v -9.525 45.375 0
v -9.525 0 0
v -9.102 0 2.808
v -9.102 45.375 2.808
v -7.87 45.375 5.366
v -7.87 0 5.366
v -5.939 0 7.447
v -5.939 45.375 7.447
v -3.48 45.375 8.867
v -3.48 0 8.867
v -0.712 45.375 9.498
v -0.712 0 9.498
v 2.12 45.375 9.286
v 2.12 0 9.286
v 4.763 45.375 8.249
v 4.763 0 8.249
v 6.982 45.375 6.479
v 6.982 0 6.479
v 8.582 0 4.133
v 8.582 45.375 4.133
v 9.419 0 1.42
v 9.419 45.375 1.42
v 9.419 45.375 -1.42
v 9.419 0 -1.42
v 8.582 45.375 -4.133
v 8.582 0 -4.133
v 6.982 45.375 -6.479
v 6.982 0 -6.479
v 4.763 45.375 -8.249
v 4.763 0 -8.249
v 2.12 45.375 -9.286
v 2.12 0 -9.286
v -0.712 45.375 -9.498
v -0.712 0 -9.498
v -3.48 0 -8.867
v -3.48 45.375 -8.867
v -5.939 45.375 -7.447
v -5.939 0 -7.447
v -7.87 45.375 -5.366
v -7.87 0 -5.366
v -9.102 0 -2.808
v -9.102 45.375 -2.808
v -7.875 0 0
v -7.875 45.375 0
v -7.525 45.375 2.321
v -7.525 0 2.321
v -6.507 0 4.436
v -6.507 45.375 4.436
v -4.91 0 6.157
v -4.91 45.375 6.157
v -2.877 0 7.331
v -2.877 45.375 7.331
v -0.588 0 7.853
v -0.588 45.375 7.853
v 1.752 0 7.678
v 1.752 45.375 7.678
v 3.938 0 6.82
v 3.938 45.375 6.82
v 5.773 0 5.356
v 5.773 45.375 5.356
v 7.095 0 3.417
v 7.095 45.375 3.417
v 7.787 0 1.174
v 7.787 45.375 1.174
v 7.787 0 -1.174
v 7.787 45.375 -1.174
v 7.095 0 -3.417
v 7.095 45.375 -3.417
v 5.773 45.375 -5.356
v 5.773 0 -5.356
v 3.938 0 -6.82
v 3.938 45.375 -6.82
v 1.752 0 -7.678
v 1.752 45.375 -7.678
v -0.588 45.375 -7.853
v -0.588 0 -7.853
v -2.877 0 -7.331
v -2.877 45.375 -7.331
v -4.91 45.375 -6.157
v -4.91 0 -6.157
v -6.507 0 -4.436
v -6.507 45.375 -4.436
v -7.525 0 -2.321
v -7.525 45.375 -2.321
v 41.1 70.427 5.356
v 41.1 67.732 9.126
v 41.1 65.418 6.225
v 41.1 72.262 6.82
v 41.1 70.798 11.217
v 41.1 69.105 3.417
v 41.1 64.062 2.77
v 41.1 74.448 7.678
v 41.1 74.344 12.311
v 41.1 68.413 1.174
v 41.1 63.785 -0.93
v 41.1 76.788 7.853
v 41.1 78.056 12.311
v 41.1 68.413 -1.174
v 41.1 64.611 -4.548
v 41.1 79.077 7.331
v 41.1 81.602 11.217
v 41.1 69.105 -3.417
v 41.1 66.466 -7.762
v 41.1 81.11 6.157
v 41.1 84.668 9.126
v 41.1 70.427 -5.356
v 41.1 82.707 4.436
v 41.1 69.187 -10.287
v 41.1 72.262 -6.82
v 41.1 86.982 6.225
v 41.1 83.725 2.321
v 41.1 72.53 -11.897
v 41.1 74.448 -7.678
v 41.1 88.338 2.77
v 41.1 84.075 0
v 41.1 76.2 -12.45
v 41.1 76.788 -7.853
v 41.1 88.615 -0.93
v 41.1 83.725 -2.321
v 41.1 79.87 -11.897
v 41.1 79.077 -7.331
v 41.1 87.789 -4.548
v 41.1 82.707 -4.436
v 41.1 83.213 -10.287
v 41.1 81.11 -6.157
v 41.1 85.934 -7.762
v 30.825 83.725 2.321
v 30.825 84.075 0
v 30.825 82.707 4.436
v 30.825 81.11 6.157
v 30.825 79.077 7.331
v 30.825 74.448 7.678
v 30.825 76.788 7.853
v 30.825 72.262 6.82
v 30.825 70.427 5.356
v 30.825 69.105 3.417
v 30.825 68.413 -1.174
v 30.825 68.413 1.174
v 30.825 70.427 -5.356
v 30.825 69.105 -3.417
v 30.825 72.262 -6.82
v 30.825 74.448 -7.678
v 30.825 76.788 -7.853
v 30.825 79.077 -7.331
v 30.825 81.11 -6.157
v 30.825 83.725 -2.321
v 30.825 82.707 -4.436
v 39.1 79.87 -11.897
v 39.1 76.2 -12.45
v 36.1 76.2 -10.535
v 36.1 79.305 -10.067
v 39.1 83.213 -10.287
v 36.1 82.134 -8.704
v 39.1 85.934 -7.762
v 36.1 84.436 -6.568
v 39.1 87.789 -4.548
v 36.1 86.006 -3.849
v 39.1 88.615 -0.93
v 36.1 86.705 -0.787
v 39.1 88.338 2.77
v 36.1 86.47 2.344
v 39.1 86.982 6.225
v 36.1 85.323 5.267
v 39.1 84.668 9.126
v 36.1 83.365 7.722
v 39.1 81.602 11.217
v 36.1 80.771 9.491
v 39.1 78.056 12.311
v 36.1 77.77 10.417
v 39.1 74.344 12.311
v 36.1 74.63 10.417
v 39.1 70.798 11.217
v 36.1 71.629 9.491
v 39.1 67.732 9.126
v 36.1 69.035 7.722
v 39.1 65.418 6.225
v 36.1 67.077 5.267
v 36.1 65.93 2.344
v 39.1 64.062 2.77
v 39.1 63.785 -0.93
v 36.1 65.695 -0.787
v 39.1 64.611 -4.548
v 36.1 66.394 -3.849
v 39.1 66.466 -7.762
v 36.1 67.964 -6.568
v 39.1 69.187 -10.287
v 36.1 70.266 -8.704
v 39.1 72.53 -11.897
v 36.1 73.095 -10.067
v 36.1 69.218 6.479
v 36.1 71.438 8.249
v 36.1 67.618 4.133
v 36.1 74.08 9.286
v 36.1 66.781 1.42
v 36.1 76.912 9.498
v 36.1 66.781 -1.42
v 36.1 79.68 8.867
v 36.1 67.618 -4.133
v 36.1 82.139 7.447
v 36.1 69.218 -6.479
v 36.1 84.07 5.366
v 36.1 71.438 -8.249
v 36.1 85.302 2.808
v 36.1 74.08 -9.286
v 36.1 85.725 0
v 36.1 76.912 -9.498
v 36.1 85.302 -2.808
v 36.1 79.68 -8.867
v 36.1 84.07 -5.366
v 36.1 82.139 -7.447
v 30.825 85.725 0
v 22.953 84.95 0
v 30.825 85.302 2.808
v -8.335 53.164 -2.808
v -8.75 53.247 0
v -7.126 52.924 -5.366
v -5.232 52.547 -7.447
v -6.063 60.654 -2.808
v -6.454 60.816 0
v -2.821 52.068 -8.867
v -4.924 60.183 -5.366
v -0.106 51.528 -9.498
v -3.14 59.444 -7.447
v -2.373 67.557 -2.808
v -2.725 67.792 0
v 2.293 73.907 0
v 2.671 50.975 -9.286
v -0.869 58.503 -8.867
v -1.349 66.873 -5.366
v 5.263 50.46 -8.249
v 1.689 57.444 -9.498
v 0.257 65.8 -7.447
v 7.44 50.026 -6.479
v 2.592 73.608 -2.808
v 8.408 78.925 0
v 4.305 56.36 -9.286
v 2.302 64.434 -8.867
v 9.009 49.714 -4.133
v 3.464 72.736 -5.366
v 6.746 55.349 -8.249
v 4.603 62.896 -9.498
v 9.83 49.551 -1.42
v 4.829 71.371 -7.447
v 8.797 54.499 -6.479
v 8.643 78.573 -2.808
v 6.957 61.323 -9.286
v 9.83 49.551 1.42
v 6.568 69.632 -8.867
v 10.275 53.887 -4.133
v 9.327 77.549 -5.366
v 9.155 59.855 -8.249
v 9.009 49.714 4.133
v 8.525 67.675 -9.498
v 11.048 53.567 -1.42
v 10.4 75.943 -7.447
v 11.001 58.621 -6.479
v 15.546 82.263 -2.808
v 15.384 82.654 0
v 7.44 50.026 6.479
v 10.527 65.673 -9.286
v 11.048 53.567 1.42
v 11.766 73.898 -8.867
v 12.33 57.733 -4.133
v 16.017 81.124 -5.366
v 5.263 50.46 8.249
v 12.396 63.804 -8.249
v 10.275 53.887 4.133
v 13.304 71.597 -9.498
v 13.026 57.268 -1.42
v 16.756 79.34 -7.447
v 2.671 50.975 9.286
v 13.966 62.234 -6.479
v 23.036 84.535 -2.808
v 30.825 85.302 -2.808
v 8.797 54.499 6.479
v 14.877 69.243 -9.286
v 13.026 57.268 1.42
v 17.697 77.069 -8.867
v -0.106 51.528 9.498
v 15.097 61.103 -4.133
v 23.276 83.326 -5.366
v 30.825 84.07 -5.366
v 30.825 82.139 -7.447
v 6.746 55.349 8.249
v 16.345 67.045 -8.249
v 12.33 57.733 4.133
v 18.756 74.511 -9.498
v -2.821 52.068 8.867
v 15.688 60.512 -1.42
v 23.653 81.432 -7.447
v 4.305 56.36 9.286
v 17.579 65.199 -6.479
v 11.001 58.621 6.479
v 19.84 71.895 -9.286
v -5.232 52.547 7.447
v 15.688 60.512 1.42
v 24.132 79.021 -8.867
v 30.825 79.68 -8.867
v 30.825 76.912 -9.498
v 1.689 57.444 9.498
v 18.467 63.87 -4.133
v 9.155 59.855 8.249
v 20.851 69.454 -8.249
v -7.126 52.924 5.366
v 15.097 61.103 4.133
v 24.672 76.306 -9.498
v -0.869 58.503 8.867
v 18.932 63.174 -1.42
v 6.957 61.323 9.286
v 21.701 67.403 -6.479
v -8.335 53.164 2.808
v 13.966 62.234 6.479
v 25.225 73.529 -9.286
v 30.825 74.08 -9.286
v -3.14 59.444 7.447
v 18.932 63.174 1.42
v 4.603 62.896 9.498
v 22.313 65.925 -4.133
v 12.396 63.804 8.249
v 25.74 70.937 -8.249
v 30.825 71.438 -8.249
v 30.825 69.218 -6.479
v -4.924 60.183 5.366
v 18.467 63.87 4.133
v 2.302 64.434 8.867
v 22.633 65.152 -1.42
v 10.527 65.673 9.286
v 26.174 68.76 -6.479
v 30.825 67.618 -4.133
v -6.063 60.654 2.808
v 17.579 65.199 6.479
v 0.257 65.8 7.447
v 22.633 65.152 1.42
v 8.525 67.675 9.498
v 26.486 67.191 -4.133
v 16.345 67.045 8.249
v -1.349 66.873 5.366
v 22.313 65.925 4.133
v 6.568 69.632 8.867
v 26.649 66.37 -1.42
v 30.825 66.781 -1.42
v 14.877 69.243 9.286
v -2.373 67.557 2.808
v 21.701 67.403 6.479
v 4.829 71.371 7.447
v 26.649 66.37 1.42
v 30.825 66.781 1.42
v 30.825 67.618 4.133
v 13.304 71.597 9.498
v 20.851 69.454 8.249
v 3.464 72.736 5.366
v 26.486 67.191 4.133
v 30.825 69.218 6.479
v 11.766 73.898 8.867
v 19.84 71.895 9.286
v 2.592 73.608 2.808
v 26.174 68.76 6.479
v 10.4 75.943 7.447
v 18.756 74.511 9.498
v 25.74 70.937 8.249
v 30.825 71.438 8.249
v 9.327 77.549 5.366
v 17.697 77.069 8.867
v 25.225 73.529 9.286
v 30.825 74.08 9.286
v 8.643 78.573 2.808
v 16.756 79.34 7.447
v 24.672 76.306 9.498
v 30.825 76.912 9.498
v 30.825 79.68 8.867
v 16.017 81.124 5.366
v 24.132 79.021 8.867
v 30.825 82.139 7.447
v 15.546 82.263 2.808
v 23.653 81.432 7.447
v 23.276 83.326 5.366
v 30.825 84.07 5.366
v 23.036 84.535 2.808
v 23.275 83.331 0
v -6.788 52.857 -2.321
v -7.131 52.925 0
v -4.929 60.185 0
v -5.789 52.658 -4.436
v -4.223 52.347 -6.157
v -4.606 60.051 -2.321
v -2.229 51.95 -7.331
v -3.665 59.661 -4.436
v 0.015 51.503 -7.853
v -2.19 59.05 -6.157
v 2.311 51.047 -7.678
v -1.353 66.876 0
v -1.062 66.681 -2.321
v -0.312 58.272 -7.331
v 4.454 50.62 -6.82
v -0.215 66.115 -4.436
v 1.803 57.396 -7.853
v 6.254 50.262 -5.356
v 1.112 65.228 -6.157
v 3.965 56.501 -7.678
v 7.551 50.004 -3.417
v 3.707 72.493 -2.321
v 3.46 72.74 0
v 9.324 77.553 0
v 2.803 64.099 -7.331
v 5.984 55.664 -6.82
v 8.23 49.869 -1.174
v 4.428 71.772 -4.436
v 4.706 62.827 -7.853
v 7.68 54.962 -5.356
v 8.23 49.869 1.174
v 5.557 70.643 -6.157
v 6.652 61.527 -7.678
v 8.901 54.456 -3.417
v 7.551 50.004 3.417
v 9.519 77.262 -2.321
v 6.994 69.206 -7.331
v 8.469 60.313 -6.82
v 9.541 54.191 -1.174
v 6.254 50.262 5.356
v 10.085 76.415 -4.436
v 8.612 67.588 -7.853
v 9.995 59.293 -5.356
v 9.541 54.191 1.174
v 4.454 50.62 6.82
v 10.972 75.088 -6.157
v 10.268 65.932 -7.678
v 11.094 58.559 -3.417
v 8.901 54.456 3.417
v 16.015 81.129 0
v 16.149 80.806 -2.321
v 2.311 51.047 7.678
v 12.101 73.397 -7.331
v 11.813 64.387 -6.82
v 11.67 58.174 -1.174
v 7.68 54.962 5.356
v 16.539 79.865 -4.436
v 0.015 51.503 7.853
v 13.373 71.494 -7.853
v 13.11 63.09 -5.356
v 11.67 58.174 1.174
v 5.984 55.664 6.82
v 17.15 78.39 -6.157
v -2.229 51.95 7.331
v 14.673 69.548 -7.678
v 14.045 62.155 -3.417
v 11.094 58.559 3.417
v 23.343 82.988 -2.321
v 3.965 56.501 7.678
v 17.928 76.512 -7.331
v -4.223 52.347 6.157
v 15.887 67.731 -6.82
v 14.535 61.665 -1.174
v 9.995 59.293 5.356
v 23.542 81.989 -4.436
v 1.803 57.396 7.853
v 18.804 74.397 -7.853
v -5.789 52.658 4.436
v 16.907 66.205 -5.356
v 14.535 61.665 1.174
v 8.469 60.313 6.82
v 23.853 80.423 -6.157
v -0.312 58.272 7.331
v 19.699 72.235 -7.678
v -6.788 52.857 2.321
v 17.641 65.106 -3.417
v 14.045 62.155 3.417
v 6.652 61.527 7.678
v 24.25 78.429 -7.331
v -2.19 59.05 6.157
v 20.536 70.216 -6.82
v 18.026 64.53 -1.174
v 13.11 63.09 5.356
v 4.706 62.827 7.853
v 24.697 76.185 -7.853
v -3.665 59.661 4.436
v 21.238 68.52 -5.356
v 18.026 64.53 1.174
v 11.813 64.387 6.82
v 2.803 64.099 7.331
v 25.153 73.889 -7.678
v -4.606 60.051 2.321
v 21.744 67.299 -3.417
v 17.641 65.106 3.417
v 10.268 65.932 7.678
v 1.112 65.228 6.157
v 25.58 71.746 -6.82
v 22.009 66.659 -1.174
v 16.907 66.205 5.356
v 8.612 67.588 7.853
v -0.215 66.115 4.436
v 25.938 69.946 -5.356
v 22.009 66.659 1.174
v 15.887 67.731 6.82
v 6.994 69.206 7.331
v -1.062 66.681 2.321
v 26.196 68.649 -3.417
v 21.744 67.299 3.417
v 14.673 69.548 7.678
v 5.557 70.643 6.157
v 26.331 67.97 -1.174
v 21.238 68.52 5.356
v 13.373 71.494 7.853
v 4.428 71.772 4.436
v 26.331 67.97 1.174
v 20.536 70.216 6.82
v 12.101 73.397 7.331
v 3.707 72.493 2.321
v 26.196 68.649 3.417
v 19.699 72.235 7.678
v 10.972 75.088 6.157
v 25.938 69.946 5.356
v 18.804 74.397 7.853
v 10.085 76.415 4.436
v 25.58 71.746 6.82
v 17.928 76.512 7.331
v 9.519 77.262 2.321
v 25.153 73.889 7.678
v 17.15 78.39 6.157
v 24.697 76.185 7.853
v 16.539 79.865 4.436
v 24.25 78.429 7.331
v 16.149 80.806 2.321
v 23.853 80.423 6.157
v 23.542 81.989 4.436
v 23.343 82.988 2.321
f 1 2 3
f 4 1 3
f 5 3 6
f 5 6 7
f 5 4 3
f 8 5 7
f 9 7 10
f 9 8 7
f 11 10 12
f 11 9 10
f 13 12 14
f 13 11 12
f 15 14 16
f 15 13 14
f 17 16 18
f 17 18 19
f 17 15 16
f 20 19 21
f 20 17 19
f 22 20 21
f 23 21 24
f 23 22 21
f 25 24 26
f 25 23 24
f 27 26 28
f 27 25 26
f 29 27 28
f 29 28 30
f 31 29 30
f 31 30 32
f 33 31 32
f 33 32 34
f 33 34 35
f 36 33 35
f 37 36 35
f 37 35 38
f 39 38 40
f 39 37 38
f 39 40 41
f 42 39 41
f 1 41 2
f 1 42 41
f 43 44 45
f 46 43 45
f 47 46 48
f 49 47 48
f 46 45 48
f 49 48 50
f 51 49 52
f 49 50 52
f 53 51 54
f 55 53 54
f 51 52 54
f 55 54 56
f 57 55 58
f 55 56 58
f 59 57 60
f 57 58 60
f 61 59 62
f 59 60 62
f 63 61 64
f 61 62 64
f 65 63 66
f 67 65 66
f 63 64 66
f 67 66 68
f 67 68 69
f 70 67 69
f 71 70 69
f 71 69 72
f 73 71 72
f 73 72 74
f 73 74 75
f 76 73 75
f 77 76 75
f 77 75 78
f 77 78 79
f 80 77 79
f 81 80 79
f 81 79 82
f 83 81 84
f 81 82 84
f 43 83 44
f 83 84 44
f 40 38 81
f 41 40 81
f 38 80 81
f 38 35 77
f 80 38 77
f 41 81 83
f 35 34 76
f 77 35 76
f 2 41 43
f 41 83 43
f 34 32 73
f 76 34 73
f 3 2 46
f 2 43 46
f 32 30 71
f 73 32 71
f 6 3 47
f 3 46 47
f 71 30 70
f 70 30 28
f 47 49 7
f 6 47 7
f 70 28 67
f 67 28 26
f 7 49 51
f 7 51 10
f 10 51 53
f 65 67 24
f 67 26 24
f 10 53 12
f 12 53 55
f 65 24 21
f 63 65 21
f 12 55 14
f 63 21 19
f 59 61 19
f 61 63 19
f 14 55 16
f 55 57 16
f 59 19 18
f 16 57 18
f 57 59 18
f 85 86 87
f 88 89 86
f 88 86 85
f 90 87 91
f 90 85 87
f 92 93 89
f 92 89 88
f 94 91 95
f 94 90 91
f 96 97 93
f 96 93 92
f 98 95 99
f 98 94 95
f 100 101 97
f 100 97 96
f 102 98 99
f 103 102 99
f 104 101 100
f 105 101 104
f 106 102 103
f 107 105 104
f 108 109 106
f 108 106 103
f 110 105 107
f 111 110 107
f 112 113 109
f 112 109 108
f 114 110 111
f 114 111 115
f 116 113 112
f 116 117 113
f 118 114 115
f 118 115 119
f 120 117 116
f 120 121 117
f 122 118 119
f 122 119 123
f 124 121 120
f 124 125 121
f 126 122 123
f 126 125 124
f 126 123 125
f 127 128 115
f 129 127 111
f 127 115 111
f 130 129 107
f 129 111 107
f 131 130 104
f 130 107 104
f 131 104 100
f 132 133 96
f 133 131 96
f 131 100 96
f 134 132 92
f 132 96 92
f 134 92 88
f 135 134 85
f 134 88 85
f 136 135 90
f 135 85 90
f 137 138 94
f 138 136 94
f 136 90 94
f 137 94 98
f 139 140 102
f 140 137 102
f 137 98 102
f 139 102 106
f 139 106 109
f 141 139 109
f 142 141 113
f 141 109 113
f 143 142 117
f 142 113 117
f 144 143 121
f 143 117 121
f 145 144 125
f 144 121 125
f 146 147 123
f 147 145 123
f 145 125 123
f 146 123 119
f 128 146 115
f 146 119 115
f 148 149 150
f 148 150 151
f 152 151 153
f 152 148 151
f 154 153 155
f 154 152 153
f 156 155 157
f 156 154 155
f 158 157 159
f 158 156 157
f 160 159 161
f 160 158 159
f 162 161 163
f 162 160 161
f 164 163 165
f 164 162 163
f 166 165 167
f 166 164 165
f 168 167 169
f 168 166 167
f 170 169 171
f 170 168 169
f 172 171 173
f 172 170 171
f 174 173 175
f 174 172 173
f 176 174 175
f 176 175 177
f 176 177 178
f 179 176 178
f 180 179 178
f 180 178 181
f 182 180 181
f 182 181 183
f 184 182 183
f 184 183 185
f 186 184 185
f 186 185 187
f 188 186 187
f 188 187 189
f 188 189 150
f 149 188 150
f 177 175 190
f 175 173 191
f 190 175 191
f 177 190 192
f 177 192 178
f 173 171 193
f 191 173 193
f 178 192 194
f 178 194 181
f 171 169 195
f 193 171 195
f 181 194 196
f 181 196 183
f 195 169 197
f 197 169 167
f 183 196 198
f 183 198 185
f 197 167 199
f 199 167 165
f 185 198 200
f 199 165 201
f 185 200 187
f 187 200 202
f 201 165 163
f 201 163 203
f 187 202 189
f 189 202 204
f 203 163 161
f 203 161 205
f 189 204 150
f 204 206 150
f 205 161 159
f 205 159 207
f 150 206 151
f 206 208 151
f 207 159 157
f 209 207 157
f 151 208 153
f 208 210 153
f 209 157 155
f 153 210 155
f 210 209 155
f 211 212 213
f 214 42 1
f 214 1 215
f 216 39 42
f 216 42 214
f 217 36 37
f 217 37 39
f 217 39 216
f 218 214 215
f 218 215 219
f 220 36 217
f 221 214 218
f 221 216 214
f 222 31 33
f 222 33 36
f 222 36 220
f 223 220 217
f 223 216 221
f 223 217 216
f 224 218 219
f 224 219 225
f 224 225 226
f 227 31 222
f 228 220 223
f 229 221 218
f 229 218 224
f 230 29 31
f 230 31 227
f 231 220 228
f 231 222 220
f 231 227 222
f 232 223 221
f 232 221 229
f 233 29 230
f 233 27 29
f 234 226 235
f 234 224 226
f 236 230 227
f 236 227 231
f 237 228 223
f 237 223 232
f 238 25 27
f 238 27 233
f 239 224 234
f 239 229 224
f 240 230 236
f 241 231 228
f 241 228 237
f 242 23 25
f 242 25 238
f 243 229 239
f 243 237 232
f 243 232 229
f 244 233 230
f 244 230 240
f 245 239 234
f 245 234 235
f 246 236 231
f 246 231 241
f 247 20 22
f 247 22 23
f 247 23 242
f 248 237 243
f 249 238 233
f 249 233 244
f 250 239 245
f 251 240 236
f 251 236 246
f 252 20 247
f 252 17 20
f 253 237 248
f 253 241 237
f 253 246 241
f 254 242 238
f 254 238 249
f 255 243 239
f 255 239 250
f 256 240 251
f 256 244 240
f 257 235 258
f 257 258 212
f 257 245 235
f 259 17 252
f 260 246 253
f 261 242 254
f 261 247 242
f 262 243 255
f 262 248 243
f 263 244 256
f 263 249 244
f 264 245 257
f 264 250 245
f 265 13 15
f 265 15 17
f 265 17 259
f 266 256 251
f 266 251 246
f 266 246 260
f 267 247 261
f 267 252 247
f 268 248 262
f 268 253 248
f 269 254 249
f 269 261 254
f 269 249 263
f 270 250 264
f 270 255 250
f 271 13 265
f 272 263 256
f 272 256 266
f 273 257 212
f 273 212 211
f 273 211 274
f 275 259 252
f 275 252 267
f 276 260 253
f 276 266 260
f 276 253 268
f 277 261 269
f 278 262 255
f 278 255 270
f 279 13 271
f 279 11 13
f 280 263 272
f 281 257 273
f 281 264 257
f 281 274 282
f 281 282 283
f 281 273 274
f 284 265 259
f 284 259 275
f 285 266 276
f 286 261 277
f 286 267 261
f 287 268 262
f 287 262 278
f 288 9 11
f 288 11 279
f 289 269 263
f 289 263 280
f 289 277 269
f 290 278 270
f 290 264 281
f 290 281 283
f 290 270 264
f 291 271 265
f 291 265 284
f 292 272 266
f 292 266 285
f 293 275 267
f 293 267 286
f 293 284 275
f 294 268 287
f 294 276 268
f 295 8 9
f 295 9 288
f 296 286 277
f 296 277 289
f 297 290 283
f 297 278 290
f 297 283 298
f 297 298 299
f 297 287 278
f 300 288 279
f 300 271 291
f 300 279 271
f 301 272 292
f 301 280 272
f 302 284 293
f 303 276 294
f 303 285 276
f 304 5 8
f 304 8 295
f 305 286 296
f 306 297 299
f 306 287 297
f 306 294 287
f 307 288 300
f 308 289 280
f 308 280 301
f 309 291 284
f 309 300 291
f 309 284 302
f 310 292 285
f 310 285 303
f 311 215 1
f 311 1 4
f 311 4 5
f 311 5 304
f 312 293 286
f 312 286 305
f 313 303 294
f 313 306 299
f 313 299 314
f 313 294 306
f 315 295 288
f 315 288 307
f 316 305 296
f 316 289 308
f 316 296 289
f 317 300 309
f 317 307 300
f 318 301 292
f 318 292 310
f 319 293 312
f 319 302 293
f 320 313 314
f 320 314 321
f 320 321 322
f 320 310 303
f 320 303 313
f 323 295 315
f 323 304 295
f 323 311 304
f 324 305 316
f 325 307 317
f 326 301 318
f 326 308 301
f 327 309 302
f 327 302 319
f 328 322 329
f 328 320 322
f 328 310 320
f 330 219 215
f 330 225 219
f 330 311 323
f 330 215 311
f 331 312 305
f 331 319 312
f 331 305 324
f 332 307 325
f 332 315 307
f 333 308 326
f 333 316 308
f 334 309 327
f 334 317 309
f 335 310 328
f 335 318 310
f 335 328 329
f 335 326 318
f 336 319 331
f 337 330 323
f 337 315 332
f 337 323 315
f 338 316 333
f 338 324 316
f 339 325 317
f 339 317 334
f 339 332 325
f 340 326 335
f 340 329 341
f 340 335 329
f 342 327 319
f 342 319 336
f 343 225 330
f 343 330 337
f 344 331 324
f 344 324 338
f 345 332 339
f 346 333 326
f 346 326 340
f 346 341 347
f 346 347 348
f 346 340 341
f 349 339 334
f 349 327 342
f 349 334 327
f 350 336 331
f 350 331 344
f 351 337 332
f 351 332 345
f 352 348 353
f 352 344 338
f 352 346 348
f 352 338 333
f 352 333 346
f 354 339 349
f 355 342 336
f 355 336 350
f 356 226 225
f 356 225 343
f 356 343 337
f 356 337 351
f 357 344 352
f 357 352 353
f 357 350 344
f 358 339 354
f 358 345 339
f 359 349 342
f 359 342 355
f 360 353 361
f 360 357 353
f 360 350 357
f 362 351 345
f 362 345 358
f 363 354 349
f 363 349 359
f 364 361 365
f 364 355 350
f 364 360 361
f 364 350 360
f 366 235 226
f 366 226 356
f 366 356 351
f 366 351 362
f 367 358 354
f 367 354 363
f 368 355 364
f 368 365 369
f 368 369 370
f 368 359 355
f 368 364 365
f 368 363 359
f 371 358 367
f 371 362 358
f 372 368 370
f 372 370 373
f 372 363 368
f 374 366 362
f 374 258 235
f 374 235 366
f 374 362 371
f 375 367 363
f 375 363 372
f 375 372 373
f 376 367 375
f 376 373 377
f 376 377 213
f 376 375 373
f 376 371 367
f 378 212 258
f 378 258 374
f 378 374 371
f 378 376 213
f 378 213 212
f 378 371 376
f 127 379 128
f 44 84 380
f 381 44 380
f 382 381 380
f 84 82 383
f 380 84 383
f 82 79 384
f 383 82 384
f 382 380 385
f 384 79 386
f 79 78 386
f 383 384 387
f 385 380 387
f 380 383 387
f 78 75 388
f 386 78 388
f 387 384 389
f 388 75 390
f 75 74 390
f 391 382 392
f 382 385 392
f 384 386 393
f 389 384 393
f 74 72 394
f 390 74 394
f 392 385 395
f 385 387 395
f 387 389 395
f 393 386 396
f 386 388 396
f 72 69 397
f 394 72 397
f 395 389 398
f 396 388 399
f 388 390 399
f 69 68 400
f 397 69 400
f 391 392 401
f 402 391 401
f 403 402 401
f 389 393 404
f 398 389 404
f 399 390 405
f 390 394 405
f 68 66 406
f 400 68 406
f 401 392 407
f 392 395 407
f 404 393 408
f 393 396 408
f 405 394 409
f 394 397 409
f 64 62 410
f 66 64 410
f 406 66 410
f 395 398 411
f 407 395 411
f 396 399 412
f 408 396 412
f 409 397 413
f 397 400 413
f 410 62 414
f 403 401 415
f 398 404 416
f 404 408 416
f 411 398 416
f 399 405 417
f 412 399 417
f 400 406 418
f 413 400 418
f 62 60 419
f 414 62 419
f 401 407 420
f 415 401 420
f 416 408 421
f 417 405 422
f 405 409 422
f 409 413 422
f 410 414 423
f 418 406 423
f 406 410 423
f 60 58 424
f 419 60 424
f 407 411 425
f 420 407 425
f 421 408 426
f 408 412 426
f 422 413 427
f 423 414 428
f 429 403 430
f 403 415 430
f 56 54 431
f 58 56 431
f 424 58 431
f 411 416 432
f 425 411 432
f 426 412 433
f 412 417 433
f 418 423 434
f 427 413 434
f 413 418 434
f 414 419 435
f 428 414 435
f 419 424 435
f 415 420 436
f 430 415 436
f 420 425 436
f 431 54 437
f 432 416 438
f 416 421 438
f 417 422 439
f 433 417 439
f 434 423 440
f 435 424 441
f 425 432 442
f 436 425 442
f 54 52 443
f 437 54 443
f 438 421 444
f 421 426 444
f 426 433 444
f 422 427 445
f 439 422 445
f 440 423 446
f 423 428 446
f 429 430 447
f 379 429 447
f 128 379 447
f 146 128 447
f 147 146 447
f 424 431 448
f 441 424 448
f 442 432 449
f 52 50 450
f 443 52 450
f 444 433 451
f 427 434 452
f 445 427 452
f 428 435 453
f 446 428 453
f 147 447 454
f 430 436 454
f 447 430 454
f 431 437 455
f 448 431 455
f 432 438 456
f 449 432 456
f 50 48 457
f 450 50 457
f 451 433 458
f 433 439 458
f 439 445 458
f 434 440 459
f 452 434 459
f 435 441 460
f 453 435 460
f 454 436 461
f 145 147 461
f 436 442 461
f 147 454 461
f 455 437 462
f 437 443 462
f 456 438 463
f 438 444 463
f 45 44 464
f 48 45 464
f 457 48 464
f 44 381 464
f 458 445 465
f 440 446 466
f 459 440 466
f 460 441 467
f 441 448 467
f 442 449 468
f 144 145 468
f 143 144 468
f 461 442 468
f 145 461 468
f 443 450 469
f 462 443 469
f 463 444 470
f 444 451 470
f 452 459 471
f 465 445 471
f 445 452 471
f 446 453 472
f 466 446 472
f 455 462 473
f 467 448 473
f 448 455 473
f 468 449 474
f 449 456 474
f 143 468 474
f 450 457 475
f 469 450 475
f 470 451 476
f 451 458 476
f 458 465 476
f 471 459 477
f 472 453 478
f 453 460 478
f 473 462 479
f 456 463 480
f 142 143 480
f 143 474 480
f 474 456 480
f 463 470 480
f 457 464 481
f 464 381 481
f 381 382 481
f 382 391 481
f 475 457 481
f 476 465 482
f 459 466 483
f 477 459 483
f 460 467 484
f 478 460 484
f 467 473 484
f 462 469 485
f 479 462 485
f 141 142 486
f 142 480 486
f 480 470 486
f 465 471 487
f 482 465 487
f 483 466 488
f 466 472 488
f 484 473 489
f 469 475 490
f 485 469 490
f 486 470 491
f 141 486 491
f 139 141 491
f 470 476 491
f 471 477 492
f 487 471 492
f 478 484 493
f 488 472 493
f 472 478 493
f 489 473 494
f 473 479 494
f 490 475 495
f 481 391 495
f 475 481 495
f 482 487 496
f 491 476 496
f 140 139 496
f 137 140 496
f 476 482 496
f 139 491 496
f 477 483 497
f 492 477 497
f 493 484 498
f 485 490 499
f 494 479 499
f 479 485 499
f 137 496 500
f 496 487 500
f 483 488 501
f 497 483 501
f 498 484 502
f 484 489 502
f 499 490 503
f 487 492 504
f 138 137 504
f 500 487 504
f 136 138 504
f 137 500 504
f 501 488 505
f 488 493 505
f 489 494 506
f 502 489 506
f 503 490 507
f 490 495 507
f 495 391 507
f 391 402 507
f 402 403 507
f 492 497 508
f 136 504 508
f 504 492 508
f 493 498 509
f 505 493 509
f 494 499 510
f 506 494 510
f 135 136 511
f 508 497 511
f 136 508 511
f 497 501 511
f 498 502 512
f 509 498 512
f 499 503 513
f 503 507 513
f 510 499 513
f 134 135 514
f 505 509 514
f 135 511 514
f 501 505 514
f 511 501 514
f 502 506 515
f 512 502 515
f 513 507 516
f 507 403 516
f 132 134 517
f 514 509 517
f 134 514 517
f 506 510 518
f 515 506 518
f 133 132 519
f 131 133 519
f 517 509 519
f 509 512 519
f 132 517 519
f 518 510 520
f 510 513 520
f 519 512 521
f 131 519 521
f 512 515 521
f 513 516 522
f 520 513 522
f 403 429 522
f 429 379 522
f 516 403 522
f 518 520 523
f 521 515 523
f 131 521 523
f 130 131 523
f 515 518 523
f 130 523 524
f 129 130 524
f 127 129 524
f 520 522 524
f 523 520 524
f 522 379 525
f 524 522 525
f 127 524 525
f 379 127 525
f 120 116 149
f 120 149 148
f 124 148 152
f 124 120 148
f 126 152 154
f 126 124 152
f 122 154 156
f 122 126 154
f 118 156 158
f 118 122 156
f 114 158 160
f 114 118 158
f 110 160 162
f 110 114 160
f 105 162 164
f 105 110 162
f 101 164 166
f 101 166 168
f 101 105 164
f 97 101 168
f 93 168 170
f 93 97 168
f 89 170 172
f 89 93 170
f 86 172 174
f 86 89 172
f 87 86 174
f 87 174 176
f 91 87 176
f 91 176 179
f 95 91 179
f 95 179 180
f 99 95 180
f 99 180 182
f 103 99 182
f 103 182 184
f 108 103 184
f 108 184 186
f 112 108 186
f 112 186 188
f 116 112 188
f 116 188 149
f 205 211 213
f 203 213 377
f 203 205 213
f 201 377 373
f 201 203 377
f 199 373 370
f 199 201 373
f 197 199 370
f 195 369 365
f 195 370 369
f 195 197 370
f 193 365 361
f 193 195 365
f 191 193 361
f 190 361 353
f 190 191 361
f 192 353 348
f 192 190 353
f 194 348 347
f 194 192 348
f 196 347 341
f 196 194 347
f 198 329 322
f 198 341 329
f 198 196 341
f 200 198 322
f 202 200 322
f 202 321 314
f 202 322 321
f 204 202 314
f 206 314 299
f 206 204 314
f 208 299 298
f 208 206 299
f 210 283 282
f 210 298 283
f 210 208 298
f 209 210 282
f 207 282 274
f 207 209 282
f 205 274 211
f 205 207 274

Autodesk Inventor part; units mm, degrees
ref_plane "YZ Plane" through (0, 0, 0) normal (1, 0, 0) x (0, 1, 0)
ref_plane "XZ Plane" through (0, 0, 0) normal (0, 1, 0) x (-1, 0, 0)
ref_plane "XY Plane" through (0, 0, 0) normal (0, 0, 1) x (1, 0, 0)
sketch "Sketch1" plane through (0, 0, 0) normal (0, 0, 1) x (1, 0, 0)
  line L0 (0, 0) -> (0, 45.375)
  line L1 (30.825, 76.2) -> (41.1, 76.2)
  arc A0 (30.825, 76.2) -> (0, 45.375) centre (30.825, 45.375) ccw
  dimension "d1" = 76.2
  dimension "d2" = 41.1
  dimension "d4" = 30.825
sketch "Sketch2" plane through (0, 0, 0) normal (0, 1, 0) x (-1, 0, 0)
  circle A0 centre (0, 0) radius 9.525
  circle A1 centre (0, 0) radius 7.875
  dimension "d3" = 19.05
  dimension "d11" = 1.65
sweep "Sweep1" add profiles "Sketch2" path "Sketch1"
sketch "Sketch3" plane through (41.1, 76.2, 0) normal (1, 0, 0) x (0, 0, -1)
  circle A0 centre (0, 0) radius 9.525 projected
  circle A1 centre (0, 0) radius 12.45
  point P0 (0, -76.2)
  dimension "d6" = 24.9
extrude "Extrusion1" add sketch "Sketch3" against normal blind 5
chamfer "Chamfer1" distance 3 distance2 1.9154 1 edges at (36.1, 76.2, 12.45) measured on face at (37.7667, 74.2029, -12.2888)
equation "\"d4\" = 0.75 * d2"
equation "\"d15\" = 0.0769231 * d6"
properties part number "Ferrule 90 deg Elb-19.05"
